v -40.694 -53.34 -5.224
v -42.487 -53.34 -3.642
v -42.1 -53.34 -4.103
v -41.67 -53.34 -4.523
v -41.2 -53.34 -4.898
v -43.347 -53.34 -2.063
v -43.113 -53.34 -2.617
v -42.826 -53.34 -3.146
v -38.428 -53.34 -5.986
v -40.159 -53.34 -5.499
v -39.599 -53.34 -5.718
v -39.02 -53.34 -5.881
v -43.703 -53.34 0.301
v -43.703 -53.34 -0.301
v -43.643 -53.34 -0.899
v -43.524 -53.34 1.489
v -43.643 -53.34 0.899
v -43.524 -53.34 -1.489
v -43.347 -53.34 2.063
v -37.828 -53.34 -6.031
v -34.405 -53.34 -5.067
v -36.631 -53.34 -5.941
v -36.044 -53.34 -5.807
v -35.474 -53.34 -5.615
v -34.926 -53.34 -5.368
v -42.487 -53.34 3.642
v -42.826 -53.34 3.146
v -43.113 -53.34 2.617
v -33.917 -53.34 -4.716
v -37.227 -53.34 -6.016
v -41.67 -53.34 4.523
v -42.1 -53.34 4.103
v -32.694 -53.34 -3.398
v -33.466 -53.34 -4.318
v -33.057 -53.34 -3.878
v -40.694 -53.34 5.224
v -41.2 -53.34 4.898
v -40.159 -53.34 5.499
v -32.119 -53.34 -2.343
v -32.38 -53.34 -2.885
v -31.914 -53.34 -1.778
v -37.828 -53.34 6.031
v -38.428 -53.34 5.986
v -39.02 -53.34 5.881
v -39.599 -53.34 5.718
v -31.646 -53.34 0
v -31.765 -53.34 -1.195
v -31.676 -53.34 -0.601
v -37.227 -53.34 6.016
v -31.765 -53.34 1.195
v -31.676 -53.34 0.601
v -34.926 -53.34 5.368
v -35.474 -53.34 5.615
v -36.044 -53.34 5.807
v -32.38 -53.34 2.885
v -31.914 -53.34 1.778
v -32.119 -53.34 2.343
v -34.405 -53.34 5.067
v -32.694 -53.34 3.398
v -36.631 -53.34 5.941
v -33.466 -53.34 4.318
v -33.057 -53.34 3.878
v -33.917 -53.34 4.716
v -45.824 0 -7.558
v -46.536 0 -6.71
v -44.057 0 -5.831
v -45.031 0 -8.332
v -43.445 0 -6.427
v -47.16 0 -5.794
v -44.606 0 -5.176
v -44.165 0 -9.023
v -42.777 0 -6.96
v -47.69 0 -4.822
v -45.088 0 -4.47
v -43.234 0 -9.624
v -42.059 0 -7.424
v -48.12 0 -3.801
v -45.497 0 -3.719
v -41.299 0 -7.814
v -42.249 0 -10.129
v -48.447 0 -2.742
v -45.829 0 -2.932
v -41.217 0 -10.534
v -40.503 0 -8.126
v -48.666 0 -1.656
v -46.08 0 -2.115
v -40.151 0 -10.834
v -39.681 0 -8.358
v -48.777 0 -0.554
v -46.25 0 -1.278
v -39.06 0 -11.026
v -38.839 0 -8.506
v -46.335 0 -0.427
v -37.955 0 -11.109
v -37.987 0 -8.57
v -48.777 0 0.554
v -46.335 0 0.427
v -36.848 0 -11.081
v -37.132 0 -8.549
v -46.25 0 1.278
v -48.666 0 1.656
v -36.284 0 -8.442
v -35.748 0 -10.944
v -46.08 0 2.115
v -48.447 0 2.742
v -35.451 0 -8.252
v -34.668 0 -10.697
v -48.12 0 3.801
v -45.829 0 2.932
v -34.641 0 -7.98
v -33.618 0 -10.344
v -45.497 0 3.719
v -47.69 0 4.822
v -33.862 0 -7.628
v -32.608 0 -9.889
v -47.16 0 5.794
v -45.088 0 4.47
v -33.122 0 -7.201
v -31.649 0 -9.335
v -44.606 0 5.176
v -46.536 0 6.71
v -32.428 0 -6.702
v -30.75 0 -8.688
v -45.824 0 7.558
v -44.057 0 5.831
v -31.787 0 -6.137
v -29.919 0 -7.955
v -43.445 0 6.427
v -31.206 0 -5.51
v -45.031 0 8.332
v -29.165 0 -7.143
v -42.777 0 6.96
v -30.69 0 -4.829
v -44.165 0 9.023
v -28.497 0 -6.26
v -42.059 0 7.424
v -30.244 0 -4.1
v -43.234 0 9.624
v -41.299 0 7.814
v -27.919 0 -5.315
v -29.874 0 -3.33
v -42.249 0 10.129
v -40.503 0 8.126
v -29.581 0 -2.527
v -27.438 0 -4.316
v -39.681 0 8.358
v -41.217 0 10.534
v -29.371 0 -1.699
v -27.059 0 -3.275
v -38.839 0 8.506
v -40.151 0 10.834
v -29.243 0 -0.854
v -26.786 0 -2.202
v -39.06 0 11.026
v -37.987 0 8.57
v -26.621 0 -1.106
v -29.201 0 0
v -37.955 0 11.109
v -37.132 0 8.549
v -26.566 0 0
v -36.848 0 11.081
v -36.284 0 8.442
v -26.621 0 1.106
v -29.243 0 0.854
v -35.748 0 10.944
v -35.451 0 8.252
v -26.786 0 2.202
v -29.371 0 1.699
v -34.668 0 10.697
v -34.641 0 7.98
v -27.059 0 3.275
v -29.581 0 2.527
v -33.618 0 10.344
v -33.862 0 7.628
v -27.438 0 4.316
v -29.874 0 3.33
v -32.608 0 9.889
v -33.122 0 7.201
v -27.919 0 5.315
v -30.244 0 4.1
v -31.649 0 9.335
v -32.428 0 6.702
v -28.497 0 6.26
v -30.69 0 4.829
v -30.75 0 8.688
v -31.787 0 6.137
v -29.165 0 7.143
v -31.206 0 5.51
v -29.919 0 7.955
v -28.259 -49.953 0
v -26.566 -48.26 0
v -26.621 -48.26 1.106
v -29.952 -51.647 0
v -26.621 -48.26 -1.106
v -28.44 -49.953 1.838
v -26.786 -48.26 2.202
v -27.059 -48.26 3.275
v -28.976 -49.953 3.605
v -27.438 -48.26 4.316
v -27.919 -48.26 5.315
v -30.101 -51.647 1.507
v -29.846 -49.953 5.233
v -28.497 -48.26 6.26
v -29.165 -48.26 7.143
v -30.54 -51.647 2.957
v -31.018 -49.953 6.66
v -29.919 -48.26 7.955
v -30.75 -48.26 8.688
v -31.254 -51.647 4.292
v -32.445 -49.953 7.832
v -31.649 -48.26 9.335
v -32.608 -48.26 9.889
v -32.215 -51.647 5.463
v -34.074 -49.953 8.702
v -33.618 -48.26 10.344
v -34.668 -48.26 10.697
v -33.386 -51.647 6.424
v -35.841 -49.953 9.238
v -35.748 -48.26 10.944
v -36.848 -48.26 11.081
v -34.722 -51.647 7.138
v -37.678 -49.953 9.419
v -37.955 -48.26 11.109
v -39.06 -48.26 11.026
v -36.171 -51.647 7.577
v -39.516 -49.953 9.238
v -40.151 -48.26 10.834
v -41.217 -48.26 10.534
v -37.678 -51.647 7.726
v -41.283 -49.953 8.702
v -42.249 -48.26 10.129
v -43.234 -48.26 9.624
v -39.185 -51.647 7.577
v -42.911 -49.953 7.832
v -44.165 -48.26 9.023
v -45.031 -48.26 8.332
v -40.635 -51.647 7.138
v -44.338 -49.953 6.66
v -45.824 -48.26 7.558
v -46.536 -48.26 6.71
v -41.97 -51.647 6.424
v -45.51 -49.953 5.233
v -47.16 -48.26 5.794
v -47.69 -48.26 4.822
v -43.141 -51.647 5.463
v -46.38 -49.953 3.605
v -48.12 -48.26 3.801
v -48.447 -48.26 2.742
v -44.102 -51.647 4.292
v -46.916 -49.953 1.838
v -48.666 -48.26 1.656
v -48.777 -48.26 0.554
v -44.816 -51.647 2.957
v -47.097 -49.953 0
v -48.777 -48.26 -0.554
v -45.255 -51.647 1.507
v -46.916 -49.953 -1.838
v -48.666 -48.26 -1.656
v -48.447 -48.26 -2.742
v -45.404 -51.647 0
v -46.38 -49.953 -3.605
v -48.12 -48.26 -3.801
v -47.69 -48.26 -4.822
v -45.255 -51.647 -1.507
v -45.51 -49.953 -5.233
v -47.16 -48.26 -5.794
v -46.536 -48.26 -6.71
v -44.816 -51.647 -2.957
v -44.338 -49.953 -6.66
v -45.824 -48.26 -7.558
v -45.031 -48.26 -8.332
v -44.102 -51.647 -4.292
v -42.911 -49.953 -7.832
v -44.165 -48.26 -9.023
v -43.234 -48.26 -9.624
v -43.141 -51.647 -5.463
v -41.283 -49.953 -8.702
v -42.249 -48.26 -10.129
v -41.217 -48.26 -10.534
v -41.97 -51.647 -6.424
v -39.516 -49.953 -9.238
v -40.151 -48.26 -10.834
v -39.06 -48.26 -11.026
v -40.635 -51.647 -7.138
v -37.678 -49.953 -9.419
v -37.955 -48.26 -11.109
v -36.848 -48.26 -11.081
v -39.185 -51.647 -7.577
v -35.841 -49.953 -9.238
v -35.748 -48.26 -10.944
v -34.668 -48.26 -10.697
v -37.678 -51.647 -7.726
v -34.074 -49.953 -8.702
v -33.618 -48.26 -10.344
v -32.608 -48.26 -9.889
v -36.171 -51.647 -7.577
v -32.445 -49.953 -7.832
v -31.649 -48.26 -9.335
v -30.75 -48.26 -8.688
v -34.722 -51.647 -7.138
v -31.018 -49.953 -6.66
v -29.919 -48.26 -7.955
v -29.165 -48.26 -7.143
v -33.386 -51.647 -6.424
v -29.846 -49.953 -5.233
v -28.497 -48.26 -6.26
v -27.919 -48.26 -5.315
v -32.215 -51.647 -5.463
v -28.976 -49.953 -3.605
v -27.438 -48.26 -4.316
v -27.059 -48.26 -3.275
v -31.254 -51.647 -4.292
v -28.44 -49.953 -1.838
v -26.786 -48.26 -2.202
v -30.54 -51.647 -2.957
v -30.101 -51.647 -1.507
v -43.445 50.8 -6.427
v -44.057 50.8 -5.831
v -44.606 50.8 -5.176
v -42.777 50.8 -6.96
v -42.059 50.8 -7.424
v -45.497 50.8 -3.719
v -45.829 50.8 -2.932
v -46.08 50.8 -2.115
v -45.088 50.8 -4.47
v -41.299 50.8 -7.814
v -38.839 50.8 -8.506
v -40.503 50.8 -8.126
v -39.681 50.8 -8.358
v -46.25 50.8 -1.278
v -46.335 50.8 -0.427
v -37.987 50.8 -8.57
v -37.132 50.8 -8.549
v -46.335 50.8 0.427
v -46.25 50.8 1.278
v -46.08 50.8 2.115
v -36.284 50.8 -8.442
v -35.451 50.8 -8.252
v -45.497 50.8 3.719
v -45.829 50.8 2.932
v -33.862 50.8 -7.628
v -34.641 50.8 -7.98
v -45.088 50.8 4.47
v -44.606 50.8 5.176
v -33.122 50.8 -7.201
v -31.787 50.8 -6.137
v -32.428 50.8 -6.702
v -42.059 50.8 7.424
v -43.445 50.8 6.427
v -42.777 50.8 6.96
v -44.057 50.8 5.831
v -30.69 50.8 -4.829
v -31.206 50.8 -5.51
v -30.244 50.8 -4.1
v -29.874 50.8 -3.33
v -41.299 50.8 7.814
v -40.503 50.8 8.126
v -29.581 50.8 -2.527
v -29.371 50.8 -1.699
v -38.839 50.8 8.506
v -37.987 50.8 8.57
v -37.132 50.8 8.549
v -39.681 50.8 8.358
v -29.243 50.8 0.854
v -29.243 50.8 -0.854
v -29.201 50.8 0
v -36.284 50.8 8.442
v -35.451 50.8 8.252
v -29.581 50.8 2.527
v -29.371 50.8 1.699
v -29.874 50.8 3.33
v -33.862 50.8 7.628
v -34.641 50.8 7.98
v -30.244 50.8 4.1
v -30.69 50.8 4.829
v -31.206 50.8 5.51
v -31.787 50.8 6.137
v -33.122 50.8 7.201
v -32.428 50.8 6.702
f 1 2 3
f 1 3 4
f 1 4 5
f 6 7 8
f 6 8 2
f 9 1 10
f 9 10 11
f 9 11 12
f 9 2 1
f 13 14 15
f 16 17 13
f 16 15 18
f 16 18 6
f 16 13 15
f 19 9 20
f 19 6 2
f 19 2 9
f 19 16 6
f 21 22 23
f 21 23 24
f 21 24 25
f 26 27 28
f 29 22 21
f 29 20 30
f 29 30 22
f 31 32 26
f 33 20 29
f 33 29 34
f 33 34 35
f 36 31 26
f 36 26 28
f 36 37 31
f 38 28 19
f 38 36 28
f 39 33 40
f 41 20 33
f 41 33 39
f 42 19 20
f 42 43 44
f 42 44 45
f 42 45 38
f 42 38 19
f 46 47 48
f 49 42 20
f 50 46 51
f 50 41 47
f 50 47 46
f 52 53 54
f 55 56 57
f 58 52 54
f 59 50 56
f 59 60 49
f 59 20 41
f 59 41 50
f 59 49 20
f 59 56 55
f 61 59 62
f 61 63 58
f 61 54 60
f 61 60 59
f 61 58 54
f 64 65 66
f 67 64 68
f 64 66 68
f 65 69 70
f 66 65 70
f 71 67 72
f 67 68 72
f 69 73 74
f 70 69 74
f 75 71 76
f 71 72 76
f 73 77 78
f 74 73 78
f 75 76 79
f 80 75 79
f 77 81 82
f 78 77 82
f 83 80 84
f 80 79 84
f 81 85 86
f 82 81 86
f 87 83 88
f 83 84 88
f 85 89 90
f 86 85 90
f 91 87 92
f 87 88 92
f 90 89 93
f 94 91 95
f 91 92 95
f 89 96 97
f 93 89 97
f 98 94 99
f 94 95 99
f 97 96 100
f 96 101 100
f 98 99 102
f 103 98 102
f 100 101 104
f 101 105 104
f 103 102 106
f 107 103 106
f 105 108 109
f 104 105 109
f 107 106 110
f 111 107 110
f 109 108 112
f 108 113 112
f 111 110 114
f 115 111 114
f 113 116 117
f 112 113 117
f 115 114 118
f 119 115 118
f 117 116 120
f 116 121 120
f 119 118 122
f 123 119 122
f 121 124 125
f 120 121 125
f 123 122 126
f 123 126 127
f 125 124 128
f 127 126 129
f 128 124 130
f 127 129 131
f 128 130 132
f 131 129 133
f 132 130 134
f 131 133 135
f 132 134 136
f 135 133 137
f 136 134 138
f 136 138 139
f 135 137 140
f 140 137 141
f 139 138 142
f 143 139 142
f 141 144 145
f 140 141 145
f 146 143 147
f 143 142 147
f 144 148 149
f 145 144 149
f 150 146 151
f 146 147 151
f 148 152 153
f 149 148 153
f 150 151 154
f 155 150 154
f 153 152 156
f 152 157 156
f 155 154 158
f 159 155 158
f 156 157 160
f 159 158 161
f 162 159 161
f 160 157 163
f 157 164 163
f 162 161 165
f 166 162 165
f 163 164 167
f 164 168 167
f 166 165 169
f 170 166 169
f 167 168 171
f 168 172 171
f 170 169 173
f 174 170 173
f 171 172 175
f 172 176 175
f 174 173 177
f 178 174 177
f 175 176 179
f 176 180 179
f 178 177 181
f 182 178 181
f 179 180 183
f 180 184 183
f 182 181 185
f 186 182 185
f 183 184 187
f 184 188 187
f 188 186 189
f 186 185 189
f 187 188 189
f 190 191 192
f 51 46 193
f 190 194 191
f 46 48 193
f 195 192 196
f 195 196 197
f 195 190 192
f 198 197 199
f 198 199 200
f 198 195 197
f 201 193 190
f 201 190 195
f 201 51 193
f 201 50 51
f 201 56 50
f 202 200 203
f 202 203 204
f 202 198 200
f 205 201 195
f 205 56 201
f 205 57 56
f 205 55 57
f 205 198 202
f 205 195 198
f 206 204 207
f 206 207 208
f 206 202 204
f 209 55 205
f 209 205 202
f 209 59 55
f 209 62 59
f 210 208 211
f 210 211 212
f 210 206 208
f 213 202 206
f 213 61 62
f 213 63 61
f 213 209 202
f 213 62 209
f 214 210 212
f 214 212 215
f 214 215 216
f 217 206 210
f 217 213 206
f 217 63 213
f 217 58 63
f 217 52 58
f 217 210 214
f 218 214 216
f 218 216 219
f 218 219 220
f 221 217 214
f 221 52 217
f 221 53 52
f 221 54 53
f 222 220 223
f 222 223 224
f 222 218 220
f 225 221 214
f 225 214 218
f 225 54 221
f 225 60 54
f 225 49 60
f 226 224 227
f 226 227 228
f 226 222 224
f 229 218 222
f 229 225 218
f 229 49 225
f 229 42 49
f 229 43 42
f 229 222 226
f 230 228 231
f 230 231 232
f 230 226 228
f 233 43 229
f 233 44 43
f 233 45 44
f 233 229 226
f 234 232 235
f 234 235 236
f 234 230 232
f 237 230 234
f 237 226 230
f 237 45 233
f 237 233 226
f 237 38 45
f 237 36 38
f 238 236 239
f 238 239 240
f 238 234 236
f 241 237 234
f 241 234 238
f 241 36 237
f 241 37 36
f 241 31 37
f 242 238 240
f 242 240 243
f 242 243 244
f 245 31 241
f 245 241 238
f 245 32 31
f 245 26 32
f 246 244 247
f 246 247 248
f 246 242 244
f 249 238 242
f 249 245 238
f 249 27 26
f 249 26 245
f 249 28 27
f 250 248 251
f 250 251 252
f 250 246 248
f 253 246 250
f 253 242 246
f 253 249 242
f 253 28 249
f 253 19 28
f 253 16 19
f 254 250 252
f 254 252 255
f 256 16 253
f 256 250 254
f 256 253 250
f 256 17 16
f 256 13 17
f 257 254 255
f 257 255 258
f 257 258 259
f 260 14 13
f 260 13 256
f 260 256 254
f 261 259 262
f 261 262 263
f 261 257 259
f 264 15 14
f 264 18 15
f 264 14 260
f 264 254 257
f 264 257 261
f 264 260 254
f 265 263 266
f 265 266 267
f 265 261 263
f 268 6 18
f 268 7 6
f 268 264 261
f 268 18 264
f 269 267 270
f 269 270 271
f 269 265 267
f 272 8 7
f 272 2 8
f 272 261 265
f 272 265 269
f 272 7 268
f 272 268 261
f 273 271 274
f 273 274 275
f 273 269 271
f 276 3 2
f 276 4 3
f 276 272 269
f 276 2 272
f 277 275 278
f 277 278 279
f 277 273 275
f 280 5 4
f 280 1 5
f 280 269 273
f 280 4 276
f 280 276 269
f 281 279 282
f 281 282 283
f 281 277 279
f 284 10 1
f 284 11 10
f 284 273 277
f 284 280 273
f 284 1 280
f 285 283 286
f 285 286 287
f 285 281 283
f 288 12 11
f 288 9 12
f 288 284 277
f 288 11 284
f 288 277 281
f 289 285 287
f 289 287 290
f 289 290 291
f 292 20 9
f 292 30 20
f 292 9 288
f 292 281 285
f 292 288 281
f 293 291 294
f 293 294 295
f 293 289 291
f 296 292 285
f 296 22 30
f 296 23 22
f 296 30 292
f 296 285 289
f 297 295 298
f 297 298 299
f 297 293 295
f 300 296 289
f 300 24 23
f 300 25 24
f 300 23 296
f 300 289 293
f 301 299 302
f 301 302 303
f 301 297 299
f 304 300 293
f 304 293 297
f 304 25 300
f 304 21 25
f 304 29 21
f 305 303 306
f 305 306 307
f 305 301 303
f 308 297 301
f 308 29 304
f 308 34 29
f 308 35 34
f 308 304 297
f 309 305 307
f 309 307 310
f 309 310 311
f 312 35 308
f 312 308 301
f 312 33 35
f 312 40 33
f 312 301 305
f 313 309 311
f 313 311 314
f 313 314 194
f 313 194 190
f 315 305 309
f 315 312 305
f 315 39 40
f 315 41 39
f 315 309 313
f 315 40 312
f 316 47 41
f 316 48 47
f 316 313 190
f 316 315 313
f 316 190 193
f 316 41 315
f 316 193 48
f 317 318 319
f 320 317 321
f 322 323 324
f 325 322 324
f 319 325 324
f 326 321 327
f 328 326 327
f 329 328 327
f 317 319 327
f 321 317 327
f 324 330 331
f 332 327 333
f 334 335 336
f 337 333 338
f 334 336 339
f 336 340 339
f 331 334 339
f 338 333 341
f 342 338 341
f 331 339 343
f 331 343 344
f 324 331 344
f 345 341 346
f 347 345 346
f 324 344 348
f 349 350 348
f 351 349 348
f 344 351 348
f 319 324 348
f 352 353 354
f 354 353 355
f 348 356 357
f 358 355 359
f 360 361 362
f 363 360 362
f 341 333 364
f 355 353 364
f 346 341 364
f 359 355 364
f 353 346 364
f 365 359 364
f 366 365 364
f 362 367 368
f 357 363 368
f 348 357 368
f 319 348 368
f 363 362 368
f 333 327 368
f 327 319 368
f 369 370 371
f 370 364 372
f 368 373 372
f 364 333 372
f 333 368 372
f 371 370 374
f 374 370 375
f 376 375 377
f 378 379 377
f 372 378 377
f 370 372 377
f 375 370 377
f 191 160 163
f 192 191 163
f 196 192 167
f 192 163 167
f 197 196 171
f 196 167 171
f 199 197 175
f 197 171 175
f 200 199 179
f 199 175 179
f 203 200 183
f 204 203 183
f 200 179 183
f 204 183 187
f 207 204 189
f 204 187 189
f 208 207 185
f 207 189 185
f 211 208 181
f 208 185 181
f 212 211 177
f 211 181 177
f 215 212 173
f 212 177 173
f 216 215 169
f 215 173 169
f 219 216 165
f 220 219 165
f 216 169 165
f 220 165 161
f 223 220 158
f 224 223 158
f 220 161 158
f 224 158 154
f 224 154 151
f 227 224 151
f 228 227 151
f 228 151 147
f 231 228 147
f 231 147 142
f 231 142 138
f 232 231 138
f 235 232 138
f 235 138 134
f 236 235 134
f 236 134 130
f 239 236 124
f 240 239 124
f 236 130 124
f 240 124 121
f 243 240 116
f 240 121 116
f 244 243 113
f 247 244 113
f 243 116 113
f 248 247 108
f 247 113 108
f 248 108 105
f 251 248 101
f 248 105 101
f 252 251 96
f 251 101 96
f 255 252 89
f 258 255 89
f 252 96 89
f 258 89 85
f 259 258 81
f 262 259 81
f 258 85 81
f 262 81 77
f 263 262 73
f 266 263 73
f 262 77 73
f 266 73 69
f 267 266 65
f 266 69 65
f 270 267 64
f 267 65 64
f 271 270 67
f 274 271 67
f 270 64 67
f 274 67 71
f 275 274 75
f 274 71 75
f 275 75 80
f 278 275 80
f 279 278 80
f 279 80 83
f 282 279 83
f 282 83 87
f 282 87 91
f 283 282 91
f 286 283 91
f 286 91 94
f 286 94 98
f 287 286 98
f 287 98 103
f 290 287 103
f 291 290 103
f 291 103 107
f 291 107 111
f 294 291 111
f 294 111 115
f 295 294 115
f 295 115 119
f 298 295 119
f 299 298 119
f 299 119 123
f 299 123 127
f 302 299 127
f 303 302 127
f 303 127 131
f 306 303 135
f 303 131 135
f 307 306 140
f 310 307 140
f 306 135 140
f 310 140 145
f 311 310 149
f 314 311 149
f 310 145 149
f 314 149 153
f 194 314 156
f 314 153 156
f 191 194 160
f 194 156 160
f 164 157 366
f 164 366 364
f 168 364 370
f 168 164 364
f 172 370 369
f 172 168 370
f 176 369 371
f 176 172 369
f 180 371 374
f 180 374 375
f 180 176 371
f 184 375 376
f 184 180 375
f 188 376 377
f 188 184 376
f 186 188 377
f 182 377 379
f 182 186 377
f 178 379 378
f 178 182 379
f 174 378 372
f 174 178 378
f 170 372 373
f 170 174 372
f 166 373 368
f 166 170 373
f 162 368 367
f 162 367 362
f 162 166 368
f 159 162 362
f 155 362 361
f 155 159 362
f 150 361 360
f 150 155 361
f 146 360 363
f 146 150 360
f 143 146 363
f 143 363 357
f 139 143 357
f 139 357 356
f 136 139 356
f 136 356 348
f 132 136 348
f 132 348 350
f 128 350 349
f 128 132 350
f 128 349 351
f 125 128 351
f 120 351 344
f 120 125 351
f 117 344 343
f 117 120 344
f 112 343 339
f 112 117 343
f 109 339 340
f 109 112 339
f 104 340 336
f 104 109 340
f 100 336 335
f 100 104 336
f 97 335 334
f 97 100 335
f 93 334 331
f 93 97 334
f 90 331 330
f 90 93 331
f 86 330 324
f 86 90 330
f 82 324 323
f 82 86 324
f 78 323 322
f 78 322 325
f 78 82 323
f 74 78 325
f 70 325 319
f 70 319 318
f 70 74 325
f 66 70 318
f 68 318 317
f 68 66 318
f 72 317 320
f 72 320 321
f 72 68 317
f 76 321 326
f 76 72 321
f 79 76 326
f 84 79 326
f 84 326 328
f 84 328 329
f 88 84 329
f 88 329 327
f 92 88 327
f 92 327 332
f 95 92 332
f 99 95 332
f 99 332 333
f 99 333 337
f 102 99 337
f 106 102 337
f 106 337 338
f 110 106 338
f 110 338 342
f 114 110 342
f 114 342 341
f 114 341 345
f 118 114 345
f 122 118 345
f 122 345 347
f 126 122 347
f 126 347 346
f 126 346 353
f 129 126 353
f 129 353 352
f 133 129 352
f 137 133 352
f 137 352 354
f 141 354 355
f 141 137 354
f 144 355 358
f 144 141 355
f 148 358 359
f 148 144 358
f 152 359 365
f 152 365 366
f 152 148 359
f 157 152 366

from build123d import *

# Parameters (mm, degrees)
F0_R     = 11.1125
F1_DEPTH = 53.34
F2_SIZE  = 5.08
F3_R     = 8.5725
F4_DEPTH = 50.8


with BuildPart() as f1:
    # F0 (on Front) → F1 (new body)
    with BuildSketch(Plane.XZ):
        with Locations((-37.678103, 0)):
            Circle(F0_R)
    extrude(amount=F1_DEPTH)

    # F2
    f2_edges = [f1.edges().sort_by_distance(p)[0] for p in [
        (-48.790603, -53.34, 0),
    ]]
    chamfer(f2_edges, length=F2_SIZE)

    # F3 (on face) → F4 (join)
    with BuildSketch(Plane.XZ):
        with Locations((-37.773054, 0)):
            Circle(F3_R)
    extrude(amount=-F4_DEPTH)


solid = f1.part
